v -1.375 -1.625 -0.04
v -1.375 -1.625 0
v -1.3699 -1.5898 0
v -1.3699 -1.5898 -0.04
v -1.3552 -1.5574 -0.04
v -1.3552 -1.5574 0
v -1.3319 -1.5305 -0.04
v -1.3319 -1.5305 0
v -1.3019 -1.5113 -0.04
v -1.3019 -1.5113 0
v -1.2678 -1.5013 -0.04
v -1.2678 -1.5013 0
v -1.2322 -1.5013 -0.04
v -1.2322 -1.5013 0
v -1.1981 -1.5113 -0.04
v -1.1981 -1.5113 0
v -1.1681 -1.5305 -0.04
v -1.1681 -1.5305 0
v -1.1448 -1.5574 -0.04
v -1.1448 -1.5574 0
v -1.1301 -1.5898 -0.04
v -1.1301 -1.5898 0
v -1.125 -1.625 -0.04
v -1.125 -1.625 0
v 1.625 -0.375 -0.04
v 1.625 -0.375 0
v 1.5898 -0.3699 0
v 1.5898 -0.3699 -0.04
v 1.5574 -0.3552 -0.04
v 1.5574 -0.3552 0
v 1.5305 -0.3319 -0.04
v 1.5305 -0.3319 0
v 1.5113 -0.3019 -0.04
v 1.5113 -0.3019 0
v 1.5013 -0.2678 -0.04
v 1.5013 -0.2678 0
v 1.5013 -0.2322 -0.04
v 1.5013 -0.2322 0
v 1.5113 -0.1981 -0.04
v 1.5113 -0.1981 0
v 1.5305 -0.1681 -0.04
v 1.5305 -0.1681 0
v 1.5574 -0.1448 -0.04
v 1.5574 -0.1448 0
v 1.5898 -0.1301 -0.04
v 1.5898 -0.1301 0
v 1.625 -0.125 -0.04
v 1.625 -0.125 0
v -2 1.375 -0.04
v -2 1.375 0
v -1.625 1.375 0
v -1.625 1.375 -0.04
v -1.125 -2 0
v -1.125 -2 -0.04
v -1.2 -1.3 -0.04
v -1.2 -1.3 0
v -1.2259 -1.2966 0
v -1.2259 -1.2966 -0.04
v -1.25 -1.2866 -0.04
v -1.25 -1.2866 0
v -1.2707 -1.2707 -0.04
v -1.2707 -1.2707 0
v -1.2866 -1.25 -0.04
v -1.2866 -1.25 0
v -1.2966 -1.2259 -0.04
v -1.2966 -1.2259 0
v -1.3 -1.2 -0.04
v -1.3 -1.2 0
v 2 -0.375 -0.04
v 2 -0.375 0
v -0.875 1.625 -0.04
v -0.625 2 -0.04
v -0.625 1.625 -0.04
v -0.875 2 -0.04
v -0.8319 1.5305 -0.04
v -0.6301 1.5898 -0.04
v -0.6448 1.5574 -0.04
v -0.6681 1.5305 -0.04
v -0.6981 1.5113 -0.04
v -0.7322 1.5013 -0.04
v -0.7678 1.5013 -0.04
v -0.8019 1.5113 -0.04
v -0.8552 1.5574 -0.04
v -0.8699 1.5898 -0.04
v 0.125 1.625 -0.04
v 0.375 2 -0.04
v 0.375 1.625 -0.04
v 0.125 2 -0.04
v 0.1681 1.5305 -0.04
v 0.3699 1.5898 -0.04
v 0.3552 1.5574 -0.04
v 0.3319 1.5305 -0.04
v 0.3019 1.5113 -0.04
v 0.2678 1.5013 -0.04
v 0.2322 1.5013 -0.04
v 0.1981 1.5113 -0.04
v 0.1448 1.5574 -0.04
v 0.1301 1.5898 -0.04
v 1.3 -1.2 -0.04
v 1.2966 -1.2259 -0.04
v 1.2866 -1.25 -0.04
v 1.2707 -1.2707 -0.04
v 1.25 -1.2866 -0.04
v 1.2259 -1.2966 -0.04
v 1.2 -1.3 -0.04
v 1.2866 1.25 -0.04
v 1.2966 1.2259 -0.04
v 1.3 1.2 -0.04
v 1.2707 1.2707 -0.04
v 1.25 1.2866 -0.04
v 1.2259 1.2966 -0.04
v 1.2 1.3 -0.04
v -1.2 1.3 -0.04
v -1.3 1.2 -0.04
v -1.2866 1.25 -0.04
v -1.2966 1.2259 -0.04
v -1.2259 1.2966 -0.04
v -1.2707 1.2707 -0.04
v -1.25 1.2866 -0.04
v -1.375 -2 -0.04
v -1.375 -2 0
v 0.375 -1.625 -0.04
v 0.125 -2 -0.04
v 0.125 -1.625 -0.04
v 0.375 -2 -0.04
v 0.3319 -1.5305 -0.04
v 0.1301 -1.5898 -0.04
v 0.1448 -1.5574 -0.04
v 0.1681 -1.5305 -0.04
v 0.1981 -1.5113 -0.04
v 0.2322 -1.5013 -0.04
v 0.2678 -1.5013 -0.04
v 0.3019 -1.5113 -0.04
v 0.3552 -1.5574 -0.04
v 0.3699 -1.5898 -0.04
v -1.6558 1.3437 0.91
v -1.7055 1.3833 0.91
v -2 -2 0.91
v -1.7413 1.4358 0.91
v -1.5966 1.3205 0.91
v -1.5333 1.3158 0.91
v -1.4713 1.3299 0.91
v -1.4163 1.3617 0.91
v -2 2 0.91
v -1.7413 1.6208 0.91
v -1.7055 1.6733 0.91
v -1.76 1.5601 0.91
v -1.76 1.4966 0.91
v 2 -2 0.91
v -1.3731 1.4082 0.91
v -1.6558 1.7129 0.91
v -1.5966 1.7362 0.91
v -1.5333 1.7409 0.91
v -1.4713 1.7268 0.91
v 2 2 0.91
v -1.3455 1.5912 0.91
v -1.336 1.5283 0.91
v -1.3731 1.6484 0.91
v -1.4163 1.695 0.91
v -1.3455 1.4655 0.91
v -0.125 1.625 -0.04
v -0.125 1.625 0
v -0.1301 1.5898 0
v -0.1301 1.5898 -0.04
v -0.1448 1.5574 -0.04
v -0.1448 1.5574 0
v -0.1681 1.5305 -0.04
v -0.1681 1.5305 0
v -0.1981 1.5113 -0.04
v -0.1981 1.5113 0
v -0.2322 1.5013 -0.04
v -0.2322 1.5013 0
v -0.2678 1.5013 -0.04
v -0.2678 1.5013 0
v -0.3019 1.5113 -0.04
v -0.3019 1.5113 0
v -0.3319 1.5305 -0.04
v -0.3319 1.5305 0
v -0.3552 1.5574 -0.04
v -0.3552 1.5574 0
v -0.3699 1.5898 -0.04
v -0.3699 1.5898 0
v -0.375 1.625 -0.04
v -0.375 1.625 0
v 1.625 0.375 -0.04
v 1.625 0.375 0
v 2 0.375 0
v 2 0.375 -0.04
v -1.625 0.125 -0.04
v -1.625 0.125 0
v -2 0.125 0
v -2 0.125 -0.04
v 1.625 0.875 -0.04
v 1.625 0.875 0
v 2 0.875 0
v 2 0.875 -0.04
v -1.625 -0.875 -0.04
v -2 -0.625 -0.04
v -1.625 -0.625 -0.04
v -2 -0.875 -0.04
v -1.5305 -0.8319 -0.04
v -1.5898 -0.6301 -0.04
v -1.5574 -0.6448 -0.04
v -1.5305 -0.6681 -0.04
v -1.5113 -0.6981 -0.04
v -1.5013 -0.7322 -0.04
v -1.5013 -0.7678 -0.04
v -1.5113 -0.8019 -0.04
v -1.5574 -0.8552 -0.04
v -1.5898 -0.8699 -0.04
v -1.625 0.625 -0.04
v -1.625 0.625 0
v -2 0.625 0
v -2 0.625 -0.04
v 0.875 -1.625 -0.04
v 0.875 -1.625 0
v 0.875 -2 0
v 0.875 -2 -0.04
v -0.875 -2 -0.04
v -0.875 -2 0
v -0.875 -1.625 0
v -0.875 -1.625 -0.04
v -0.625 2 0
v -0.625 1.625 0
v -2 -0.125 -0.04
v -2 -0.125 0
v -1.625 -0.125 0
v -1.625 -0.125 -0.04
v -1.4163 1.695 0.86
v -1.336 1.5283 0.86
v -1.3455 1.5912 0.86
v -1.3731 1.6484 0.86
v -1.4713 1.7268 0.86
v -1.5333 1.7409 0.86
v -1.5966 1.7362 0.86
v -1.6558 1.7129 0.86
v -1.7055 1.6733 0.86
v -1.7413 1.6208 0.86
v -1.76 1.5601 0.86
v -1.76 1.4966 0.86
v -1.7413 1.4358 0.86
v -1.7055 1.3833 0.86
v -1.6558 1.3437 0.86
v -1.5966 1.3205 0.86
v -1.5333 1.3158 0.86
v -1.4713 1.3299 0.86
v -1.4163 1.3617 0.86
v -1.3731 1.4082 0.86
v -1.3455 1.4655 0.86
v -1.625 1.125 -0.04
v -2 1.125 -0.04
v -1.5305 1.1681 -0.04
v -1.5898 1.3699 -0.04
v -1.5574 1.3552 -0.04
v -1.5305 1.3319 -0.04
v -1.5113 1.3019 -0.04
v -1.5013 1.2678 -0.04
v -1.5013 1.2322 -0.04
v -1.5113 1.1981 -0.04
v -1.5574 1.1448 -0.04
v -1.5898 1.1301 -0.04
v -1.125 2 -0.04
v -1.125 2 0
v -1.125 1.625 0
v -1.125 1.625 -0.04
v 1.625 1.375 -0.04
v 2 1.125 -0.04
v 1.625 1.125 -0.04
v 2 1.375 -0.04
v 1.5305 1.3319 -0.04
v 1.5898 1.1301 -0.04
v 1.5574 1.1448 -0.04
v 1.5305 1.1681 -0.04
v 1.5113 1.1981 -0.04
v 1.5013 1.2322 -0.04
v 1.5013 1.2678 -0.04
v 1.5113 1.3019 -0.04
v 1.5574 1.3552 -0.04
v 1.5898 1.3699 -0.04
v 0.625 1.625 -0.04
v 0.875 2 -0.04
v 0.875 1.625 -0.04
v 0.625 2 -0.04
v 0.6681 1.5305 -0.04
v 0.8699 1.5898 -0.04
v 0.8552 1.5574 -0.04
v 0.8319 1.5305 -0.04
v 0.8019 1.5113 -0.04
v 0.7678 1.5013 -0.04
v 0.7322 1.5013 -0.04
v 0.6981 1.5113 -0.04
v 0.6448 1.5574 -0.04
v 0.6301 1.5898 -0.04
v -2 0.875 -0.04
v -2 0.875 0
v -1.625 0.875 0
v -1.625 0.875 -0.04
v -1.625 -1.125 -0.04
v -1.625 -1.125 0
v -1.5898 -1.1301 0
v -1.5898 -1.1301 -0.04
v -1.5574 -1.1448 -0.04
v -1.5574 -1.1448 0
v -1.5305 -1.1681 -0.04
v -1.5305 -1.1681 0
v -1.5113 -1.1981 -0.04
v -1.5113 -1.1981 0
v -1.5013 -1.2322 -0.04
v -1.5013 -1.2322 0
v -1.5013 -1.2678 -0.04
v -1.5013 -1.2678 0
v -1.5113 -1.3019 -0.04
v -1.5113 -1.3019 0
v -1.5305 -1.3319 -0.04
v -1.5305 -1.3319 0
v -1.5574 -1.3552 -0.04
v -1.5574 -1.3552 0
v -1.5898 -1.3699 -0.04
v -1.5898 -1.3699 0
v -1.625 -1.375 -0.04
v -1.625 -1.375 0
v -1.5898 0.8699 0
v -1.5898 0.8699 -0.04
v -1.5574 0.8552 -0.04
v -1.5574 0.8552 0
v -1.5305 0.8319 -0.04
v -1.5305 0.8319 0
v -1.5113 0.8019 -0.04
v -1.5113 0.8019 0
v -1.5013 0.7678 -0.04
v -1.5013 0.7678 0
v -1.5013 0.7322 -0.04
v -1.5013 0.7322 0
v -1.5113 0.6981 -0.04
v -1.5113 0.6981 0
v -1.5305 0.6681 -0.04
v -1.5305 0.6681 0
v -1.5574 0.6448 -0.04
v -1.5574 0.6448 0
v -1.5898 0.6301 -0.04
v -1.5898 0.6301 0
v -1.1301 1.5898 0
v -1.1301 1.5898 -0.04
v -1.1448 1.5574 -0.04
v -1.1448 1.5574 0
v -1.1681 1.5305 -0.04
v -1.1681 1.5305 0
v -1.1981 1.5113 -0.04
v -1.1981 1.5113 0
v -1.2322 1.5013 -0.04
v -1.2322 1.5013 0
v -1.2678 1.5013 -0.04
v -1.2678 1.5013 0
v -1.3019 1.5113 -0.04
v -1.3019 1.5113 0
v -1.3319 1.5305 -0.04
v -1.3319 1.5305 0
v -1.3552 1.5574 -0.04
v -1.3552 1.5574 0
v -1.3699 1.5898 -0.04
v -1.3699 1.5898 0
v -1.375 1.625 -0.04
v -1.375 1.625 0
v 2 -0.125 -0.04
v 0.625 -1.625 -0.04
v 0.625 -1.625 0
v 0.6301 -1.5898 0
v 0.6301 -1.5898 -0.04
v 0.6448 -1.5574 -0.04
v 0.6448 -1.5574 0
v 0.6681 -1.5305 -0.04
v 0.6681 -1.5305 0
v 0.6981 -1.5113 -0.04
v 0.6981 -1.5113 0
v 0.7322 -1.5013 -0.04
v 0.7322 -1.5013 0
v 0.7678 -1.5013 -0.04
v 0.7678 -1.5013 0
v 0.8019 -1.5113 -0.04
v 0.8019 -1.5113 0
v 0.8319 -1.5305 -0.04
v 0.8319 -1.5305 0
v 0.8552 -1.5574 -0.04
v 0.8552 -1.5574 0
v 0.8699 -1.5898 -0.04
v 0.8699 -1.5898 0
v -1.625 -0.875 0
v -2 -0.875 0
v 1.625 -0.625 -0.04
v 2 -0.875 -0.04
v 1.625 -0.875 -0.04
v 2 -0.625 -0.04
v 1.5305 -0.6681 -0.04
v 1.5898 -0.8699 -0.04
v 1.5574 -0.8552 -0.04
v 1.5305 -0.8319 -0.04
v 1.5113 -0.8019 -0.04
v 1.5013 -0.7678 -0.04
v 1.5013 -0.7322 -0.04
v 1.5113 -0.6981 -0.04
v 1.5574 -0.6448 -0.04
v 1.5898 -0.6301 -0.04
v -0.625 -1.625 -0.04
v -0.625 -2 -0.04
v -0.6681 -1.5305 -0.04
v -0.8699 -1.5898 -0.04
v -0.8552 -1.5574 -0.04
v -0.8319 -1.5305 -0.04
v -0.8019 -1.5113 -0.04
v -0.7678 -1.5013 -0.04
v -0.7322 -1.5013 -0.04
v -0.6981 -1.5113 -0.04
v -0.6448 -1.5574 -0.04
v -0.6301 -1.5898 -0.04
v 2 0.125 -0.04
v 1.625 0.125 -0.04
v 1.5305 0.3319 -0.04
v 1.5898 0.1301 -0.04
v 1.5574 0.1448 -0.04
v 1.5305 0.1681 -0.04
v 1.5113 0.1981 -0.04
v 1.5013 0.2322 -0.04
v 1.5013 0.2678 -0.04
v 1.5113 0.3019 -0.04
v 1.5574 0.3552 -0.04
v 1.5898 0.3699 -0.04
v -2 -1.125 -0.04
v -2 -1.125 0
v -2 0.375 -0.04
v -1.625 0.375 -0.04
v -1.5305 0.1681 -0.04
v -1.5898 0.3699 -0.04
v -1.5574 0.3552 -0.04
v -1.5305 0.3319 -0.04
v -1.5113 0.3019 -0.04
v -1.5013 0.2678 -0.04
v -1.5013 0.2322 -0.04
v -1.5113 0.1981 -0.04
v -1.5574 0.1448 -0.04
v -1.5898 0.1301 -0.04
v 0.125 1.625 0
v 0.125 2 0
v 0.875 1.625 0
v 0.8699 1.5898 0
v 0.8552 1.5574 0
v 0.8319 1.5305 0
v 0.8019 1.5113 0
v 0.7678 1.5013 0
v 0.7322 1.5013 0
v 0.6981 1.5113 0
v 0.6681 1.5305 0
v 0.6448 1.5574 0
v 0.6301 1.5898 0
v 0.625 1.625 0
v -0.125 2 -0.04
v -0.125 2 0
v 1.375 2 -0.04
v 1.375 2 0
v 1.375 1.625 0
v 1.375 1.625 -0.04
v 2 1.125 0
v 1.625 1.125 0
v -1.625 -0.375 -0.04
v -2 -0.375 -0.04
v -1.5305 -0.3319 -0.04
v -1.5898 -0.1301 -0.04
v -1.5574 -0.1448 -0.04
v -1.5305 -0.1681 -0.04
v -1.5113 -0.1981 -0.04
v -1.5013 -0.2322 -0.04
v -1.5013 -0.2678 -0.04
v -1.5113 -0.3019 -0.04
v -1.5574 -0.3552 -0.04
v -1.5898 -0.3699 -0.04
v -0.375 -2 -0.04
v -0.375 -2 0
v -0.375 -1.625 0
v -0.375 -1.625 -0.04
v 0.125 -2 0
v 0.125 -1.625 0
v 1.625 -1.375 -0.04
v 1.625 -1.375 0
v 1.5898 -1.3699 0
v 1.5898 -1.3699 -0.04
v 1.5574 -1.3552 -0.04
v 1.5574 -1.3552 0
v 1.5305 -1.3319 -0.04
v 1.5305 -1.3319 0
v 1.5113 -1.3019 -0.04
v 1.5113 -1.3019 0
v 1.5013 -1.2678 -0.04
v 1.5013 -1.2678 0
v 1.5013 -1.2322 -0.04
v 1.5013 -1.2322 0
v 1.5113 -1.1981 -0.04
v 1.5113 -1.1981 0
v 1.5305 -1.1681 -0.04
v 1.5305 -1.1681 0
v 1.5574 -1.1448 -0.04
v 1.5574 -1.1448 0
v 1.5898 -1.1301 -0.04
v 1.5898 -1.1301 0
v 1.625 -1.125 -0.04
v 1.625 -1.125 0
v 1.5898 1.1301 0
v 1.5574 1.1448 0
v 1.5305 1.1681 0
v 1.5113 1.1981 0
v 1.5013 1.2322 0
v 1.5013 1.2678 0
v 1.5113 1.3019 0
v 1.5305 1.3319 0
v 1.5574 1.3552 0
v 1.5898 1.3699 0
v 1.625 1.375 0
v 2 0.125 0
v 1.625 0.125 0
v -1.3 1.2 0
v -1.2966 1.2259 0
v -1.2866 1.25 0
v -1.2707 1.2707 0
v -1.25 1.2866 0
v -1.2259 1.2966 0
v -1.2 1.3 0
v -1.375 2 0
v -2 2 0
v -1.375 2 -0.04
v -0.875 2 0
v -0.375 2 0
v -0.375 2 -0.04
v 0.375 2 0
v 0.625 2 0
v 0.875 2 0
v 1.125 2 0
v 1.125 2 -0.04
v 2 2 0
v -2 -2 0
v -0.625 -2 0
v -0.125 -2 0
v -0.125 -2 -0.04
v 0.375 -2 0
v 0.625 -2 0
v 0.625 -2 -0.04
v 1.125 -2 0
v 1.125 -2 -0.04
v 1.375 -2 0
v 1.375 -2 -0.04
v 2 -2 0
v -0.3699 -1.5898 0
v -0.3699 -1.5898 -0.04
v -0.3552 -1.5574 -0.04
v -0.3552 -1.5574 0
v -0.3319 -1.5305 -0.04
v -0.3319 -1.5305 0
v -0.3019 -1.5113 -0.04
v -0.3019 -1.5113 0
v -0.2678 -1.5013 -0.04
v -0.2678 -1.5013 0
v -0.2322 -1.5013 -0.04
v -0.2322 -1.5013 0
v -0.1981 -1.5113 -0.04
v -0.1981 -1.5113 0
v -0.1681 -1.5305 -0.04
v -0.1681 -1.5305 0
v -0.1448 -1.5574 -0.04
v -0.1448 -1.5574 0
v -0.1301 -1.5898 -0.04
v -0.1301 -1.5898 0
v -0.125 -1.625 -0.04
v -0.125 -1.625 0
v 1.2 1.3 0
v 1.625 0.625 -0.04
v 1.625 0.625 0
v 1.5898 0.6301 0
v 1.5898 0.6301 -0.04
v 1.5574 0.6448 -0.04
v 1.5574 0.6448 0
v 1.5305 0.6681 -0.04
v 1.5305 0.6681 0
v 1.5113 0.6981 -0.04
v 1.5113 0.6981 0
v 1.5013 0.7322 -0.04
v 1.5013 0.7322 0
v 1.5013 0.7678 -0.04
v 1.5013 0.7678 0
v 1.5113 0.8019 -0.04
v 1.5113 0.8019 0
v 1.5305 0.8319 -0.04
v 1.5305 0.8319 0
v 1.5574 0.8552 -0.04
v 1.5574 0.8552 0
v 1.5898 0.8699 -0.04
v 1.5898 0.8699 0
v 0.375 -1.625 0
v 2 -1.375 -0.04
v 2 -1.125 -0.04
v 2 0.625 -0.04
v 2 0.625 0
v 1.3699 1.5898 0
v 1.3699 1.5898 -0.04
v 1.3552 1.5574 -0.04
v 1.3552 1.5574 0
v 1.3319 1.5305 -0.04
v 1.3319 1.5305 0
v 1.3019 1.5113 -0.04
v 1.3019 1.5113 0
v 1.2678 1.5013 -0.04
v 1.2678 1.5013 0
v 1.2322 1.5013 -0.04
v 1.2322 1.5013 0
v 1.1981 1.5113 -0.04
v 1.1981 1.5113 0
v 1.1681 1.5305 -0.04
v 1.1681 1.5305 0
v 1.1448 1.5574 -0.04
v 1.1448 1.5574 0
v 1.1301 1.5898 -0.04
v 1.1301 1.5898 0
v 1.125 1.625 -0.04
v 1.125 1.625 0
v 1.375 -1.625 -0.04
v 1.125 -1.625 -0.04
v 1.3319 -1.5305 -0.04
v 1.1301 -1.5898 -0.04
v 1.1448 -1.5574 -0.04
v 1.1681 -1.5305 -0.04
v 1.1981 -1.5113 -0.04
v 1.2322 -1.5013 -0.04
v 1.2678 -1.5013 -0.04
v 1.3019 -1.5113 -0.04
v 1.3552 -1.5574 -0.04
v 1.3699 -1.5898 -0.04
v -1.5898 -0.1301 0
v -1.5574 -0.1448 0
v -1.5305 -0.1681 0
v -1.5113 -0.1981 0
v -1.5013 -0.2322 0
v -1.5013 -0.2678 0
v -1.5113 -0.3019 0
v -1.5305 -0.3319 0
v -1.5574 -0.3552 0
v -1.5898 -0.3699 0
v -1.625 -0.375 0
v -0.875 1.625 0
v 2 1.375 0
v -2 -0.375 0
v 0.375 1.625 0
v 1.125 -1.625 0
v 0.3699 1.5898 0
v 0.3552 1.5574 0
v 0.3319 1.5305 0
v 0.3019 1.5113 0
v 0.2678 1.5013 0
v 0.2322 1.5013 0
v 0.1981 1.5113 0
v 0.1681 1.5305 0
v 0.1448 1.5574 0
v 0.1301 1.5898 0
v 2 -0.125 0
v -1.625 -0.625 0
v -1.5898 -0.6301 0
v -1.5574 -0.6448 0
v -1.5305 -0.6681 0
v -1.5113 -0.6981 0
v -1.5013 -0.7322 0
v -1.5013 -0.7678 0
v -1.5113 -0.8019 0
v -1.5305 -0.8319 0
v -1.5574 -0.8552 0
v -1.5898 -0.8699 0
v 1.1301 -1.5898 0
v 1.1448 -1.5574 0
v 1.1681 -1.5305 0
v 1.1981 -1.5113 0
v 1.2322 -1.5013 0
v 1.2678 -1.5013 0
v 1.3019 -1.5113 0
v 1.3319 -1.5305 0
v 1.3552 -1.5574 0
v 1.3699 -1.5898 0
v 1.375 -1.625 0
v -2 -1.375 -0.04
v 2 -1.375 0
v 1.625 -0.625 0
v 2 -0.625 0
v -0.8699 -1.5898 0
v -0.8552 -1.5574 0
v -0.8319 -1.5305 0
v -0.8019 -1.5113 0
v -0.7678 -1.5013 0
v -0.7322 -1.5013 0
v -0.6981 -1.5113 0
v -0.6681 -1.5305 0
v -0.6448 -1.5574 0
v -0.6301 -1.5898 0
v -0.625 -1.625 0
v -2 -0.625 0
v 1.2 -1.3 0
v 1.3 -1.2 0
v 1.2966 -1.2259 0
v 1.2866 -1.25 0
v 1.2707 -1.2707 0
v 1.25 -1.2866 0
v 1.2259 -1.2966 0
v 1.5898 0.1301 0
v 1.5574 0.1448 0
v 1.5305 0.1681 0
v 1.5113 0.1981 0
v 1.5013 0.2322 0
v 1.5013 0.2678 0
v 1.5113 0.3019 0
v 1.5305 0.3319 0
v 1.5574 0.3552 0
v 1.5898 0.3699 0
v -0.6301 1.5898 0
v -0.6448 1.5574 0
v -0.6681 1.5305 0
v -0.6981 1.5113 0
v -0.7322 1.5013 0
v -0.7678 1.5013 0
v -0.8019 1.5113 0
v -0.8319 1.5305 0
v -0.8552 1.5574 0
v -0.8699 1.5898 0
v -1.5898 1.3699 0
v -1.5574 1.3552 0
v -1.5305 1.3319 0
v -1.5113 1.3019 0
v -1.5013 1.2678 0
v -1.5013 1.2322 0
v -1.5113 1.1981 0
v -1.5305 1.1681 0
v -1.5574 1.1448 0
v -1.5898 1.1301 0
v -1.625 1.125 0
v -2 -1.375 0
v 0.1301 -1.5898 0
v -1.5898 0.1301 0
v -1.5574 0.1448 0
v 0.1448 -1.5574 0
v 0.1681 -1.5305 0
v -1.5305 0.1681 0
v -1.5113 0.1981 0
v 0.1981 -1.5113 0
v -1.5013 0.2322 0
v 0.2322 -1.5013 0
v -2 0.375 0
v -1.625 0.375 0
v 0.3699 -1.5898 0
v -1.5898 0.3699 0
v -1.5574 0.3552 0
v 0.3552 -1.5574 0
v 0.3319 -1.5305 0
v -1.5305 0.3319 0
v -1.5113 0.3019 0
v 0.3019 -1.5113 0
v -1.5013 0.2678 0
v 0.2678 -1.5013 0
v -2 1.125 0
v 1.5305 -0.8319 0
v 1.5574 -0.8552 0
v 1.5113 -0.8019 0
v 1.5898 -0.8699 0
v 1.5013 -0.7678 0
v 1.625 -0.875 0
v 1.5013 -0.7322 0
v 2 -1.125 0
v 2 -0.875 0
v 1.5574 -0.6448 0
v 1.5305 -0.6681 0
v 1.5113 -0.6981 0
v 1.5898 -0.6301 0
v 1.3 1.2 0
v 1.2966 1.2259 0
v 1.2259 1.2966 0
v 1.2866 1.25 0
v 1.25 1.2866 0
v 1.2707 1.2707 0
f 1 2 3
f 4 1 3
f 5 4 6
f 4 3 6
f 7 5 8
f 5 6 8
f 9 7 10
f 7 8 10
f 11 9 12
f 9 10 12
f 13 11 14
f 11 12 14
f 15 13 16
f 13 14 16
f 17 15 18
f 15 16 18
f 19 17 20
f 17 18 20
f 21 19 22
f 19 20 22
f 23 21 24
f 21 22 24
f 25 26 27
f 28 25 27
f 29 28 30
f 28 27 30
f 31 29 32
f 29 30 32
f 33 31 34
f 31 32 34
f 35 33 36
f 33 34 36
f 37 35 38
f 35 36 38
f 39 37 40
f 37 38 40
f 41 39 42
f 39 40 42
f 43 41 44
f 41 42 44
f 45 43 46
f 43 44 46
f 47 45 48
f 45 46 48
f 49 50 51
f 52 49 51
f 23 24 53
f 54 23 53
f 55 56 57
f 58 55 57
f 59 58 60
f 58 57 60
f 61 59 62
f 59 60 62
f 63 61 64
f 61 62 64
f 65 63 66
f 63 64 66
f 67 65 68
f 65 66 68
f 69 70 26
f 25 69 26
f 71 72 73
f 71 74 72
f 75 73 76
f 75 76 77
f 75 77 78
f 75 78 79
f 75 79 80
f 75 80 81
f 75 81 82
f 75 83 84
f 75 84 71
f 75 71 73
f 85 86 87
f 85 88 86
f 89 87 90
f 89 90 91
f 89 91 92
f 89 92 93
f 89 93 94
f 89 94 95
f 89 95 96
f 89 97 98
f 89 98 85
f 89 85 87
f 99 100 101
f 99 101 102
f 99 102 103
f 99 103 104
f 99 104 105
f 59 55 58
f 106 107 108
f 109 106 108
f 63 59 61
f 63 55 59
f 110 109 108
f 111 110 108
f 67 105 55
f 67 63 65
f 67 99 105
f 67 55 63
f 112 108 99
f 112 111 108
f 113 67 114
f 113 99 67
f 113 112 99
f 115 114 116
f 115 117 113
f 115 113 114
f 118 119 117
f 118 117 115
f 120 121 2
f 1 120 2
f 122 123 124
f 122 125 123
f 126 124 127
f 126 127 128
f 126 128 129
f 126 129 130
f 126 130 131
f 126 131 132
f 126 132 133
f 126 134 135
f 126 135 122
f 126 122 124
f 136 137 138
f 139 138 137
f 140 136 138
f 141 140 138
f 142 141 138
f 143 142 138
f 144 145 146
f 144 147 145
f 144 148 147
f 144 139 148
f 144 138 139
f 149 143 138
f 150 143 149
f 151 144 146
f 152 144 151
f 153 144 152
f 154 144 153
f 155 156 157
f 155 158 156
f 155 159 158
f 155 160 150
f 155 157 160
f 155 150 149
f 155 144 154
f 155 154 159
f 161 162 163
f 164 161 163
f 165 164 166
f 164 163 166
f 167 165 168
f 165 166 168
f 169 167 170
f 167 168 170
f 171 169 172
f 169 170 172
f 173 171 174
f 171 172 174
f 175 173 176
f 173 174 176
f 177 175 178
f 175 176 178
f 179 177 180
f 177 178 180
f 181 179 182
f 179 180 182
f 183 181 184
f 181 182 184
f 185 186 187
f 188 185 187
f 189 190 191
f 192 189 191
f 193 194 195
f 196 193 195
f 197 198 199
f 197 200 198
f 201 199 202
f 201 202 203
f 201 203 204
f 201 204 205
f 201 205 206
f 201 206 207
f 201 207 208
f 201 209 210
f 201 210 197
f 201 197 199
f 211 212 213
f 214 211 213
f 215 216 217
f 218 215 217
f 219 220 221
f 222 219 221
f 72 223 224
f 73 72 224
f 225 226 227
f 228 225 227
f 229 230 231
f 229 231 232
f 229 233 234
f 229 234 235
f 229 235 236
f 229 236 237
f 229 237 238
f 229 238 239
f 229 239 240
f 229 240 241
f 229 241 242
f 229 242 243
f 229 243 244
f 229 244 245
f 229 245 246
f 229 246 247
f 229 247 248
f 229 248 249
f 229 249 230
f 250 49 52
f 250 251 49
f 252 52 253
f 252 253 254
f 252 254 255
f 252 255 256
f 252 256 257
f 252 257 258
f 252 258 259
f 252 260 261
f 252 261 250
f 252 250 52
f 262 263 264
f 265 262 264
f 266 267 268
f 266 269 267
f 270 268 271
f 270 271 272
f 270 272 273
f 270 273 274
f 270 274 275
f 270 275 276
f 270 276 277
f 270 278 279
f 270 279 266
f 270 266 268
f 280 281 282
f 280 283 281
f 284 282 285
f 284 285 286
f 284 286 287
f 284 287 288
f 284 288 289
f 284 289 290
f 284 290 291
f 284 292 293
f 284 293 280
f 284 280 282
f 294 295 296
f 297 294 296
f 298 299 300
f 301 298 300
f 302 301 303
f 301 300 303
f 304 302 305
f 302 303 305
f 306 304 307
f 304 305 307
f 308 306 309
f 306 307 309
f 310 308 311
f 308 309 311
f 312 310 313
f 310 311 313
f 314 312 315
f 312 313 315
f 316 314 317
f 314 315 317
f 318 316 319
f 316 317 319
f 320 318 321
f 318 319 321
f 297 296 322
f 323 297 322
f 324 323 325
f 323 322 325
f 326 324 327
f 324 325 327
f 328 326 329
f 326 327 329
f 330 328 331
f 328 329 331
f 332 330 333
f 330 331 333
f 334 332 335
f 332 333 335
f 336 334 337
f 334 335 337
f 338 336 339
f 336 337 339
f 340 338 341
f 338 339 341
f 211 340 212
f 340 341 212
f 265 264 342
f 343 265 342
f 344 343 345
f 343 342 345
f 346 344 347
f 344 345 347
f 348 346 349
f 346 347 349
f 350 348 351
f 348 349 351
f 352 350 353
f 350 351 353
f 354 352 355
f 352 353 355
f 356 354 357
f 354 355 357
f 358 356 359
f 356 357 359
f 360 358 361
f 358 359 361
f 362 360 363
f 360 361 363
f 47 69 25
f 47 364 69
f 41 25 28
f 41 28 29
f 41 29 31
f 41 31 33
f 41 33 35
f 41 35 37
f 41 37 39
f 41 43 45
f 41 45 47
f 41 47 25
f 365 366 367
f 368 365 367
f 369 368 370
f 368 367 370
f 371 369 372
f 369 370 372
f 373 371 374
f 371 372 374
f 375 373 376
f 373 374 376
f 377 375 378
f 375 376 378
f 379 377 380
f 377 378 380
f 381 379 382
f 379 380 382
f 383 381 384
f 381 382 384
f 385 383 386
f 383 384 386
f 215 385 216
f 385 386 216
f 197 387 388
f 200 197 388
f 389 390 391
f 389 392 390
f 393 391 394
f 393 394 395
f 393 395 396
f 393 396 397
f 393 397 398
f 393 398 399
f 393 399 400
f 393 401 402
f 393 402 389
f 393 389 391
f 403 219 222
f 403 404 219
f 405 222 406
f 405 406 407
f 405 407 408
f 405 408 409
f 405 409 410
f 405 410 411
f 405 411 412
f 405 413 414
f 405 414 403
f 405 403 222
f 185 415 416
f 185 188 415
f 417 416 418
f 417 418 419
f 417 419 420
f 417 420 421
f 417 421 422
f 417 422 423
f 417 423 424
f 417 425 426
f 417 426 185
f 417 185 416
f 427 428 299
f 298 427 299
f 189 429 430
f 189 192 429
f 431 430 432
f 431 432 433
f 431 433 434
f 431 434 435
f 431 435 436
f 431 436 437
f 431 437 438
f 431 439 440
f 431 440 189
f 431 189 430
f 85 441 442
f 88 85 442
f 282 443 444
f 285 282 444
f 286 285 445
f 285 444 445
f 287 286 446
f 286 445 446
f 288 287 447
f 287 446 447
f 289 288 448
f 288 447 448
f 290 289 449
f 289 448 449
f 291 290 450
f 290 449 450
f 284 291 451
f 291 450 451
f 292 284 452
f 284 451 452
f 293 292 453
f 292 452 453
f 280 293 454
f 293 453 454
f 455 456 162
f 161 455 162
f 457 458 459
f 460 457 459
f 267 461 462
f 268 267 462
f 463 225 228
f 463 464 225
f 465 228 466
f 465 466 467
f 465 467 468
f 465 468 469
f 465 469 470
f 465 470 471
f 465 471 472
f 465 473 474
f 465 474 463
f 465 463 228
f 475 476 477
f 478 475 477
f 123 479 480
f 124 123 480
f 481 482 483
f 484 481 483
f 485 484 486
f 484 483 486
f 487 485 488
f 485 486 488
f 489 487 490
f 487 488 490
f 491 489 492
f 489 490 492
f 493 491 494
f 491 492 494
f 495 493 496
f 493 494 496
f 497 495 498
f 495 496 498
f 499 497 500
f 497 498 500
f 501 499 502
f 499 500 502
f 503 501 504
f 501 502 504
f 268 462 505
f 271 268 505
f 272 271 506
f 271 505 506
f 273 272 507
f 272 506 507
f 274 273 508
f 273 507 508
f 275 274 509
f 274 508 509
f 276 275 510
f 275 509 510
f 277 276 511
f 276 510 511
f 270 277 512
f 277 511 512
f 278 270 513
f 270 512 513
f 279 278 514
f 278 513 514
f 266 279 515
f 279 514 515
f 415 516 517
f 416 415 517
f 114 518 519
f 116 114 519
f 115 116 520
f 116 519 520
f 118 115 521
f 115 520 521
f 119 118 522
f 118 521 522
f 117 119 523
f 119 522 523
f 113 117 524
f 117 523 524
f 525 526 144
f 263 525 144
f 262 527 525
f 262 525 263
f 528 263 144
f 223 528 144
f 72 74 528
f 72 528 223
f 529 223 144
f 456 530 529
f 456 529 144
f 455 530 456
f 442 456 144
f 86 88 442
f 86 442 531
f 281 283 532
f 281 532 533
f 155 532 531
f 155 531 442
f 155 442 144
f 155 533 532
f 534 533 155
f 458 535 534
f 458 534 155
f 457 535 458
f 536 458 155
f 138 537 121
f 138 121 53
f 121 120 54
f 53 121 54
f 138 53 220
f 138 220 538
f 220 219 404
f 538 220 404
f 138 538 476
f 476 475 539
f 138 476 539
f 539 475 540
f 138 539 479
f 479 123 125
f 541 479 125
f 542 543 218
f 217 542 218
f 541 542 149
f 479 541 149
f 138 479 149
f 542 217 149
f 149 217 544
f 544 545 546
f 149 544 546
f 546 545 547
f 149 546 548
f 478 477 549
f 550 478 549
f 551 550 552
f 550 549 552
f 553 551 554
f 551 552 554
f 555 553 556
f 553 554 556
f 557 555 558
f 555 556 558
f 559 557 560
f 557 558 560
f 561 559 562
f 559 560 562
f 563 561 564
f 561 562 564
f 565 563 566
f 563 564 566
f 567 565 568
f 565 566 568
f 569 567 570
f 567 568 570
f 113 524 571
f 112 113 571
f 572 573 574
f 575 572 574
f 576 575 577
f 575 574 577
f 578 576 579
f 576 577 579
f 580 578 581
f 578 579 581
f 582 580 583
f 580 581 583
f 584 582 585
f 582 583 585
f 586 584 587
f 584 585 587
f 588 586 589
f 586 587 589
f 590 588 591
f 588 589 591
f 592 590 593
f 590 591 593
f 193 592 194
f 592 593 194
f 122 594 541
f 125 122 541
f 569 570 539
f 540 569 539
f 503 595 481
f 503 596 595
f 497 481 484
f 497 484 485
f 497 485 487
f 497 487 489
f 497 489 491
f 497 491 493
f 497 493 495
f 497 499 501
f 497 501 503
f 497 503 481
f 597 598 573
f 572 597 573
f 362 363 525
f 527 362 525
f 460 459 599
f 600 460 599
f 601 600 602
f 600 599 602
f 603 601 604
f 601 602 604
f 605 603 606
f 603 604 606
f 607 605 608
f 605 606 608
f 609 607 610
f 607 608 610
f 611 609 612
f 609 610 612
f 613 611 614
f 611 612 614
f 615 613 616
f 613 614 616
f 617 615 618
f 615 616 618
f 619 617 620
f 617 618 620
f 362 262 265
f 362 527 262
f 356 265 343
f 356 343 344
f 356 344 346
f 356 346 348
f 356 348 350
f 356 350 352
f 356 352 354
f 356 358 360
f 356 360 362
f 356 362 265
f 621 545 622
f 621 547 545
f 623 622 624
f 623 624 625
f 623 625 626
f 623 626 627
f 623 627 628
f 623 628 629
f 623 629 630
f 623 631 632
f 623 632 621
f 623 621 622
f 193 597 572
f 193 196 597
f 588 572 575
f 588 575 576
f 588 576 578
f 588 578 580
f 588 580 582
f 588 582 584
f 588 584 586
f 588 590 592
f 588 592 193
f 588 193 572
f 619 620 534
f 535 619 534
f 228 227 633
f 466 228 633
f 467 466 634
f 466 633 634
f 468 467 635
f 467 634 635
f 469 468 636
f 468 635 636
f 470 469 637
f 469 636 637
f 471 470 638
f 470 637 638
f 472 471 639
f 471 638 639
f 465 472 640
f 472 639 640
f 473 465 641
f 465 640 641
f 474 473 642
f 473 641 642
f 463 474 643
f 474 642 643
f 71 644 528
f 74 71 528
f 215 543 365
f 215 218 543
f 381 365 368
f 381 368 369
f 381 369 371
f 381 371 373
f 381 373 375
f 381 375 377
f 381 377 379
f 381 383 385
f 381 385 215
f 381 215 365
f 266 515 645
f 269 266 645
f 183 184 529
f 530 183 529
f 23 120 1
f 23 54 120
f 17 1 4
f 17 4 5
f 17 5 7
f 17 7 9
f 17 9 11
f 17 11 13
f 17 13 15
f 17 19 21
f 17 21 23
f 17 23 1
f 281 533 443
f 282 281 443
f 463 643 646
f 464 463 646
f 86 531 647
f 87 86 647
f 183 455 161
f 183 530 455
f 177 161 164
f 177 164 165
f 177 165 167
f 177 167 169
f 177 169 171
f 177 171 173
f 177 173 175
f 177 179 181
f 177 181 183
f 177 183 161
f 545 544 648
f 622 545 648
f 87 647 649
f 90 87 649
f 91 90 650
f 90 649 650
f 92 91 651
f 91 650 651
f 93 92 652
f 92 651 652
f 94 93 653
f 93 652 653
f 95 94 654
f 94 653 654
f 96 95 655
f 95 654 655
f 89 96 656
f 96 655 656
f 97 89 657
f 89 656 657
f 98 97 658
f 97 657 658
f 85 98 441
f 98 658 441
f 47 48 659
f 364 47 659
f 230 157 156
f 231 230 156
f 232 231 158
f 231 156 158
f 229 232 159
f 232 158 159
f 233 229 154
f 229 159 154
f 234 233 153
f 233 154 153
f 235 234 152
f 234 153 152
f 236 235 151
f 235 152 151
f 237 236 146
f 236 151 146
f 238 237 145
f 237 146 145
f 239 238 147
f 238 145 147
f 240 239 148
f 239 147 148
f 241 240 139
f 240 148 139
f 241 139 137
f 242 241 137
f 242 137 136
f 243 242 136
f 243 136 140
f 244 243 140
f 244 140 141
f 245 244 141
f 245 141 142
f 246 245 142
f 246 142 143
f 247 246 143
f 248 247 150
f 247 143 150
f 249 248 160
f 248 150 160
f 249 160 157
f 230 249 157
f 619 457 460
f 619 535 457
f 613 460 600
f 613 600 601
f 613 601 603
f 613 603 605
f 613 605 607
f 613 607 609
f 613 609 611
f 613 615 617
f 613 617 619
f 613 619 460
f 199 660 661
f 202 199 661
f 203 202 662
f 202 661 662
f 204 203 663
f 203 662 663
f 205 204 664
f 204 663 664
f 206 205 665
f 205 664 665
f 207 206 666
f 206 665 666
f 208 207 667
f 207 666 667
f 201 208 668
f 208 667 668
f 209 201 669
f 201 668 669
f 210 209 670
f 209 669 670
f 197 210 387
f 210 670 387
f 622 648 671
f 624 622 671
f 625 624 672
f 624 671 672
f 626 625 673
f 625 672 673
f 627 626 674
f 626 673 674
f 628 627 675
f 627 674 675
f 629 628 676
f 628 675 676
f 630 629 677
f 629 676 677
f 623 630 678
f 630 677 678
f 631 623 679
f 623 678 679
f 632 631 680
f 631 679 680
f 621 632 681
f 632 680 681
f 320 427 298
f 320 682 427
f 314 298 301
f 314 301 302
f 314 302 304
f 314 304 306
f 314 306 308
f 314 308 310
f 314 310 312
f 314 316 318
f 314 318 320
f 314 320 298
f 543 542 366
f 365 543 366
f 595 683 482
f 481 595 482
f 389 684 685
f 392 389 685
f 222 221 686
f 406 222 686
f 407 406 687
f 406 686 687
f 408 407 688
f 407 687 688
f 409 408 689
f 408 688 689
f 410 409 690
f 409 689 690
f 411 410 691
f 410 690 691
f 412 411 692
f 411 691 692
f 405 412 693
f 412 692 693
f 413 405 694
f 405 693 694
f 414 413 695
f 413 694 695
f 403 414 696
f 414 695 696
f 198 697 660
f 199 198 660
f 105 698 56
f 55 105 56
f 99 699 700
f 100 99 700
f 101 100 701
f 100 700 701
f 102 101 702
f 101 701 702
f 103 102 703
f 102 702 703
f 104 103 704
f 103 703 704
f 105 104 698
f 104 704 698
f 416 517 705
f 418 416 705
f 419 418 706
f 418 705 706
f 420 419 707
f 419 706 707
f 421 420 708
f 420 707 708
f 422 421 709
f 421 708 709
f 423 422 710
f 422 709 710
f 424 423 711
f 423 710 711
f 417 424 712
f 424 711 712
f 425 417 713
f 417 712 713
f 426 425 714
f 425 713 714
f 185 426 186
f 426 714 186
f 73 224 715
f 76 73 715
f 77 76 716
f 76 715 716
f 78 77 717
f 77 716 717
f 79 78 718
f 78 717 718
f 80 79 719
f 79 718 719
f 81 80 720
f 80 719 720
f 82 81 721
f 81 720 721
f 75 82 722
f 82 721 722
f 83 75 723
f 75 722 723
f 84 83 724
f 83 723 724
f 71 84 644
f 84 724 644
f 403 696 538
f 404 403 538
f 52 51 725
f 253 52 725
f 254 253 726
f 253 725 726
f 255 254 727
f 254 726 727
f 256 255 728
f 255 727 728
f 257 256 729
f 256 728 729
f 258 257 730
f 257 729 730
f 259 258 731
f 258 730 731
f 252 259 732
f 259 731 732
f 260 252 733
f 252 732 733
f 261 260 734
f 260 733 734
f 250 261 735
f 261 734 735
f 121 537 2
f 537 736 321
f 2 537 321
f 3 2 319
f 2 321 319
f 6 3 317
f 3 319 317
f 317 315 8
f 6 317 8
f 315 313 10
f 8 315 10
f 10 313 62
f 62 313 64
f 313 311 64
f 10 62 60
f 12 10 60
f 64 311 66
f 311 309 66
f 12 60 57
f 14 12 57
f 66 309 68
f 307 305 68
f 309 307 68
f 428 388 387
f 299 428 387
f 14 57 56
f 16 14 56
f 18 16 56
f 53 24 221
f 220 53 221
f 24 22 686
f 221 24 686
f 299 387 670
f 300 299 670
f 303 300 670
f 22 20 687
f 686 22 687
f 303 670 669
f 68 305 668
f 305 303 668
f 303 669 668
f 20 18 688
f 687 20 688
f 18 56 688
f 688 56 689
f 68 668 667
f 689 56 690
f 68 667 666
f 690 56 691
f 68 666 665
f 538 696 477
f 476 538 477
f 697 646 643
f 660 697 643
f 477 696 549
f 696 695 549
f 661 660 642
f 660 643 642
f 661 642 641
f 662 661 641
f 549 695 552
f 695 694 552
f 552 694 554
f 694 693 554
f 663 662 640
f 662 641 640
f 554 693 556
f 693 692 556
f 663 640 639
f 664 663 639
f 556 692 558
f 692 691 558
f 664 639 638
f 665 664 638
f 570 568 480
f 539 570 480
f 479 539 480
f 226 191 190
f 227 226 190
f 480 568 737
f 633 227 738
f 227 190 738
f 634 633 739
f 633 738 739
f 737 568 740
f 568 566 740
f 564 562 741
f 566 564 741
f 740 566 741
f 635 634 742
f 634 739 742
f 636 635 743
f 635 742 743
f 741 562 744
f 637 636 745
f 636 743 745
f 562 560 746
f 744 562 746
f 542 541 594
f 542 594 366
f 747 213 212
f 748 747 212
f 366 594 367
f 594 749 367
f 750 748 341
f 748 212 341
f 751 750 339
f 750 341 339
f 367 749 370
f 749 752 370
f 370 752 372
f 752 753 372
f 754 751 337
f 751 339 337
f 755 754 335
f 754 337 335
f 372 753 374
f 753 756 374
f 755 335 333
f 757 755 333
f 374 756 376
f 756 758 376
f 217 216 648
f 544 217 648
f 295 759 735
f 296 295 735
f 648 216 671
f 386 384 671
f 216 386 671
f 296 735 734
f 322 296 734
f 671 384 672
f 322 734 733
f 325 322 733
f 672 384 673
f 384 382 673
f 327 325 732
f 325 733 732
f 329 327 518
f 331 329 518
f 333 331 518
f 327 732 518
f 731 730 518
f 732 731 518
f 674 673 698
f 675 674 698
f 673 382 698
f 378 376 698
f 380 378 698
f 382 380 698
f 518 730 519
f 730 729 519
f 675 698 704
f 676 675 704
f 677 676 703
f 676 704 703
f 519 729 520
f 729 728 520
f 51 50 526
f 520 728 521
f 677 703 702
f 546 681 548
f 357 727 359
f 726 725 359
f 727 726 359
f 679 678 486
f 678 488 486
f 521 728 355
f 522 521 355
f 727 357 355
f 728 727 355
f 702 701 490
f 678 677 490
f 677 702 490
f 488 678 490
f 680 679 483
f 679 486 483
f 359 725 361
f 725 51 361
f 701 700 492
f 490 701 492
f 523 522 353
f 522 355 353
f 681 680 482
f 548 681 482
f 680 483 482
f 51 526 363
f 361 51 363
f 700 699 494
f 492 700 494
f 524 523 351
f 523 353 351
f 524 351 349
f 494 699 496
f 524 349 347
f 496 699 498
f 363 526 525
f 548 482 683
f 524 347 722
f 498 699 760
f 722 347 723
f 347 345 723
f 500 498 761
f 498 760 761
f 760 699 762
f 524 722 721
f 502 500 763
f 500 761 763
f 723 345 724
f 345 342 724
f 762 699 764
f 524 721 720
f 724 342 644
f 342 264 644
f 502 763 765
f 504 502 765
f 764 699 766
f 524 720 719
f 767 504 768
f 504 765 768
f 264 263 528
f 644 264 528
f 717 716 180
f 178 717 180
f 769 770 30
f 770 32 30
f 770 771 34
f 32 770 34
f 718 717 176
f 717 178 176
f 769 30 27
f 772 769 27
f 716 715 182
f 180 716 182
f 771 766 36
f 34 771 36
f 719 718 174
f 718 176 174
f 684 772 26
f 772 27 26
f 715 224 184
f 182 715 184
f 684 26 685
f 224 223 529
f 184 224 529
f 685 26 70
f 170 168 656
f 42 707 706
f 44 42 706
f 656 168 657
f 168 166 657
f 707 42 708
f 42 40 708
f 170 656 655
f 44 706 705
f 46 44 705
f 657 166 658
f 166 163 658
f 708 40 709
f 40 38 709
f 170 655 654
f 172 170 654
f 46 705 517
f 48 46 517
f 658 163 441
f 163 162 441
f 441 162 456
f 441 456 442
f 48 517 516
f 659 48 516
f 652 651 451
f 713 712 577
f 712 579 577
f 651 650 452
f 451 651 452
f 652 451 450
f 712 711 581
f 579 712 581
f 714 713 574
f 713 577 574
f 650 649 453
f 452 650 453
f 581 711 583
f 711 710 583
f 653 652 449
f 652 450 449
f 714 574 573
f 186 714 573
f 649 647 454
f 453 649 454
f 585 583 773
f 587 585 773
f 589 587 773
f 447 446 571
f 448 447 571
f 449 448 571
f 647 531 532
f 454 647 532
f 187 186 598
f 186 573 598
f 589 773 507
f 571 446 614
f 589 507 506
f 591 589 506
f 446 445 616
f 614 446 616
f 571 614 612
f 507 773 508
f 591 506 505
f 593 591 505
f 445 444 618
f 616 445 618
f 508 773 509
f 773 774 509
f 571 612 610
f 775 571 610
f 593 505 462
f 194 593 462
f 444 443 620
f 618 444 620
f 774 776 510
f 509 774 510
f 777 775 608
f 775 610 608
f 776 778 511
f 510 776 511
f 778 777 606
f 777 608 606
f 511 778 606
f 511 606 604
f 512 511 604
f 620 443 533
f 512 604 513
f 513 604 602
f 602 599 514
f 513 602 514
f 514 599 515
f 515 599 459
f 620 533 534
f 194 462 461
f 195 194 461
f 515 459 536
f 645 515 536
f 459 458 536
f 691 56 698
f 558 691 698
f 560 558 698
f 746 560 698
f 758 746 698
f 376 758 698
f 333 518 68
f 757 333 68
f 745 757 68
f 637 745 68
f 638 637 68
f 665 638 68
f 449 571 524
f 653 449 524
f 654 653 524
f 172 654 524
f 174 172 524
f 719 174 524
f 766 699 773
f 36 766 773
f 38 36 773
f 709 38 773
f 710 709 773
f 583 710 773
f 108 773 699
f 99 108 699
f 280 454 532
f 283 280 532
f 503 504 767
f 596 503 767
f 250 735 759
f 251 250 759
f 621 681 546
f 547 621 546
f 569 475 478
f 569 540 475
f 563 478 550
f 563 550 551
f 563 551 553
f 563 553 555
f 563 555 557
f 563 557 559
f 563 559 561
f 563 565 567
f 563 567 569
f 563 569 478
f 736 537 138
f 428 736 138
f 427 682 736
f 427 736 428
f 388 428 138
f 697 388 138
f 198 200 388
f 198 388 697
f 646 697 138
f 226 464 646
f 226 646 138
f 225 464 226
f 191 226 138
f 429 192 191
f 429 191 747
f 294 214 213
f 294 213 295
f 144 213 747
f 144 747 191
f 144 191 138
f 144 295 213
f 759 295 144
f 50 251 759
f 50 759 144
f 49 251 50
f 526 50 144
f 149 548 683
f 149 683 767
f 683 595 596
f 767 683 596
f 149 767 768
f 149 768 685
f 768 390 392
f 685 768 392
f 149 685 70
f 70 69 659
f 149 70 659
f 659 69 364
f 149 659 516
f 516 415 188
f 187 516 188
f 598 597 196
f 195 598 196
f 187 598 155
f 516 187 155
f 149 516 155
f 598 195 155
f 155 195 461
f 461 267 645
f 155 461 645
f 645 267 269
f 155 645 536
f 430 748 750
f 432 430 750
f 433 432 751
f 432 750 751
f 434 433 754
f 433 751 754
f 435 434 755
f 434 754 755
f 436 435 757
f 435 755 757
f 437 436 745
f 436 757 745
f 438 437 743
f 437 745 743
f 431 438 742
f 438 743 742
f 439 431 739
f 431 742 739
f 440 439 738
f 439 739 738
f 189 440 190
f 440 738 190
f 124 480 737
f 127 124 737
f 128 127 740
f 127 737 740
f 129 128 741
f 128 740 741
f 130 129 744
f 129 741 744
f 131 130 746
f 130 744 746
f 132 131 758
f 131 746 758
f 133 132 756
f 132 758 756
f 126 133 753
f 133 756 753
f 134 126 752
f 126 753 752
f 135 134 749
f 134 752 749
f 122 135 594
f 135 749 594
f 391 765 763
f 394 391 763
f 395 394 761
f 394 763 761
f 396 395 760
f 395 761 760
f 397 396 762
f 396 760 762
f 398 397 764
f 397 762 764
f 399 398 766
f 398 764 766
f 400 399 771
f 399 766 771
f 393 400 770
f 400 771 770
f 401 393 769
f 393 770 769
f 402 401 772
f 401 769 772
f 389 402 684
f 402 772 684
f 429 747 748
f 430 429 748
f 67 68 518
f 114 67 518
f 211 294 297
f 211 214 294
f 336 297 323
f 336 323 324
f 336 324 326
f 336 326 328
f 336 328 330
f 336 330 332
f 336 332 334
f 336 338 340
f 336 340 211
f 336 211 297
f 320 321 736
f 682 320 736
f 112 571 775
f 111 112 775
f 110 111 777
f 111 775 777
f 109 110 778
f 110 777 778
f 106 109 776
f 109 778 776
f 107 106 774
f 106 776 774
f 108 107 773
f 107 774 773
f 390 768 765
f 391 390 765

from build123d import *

# Parameters (mm, degrees)
SKETCH1_W                 = 4
SKETCH1_H                 = 4
BOSS_EXTRUDE1_DEPTH       = 0.91
BOSS_EXTRUDE2_DEPTH       = 0.04
BOSS_EXTRUDE3_DEPTH       = 0.04
LPATTERN1_COUNT           = 6
LPATTERN1_PITCH           = 0.5
CIRPATTERN1_COUNT         = 4
CIRPATTERN1_COPY_1_DEPTH  = 0.04
CIRPATTERN1_COPY_2_DEPTH  = 0.04
CIRPATTERN1_COPY_3_DEPTH  = 0.04
CIRPATTERN1_COPY_4_DEPTH  = 0.04
CIRPATTERN1_COPY_5_DEPTH  = 0.04
CIRPATTERN1_COPY_6_DEPTH  = 0.04
CIRPATTERN1_COPY_7_DEPTH  = 0.04
CIRPATTERN1_COPY_8_DEPTH  = 0.04
CIRPATTERN1_COPY_9_DEPTH  = 0.04
CIRPATTERN1_COPY_10_DEPTH = 0.04
CIRPATTERN1_COPY_11_DEPTH = 0.04
CIRPATTERN1_COPY_12_DEPTH = 0.04
CIRPATTERN1_COPY_13_DEPTH = 0.04
CIRPATTERN1_COPY_14_DEPTH = 0.04
CIRPATTERN1_COPY_15_DEPTH = 0.04
SKETCH4_R                 = 0.213174932
CUT_EXTRUDE1_DEPTH        = 0.05


with BuildPart() as part:
    # Sketch1 → Boss-Extrude1 (new body)
    with BuildSketch(Plane.XY):
        Rectangle(SKETCH1_W, SKETCH1_H)
    extrude(amount=BOSS_EXTRUDE1_DEPTH)

    # Sketch2 → Boss-Extrude2 (add)
    with BuildSketch(Plane(origin=(0, 0, 0), x_dir=(-1, 0, 0), z_dir=(0, 0, -1))):
        with BuildLine():
            Line((-1.2, -1.3), (1.2, -1.3))
            ThreePointArc((1.2, -1.3), (1.270710678, -1.270710678), (1.3, -1.2))
            Line((1.3, -1.2), (1.3, 1.2))
            ThreePointArc((1.3, 1.2), (1.270710678, 1.270710678), (1.2, 1.3))
            Line((1.2, 1.3), (-1.2, 1.3))
            ThreePointArc((-1.2, 1.3), (-1.270710678, 1.270710678), (-1.3, 1.2))
            Line((-1.3, 1.2), (-1.3, -1.2))
            ThreePointArc((-1.3, -1.2), (-1.270710678, -1.270710678), (-1.2, -1.3))
        make_face()
    extrude(amount=BOSS_EXTRUDE2_DEPTH)

    # Sketch3 → Boss-Extrude3 (add)
    with BuildSketch(Plane(origin=(0, 0, 0), x_dir=(-1, 0, 0), z_dir=(0, 0, -1))):
        with BuildLine():
            Line((-2, 1.125), (-1.625, 1.125))
            ThreePointArc((-1.625, 1.125), (-1.5, 1.25), (-1.625, 1.375))
            Line((-1.625, 1.375), (-2, 1.375))
            Line((-2, 1.375), (-2, 1.125))
        make_face()
    boss_extrude3 = extrude(amount=BOSS_EXTRUDE3_DEPTH)

    # LPattern1: Boss-Extrude3 ×6
    with Locations(*[(0, -i * LPATTERN1_PITCH, 0) for i in range(1, LPATTERN1_COUNT)]):
        add(boss_extrude3)

    # CirPattern1: Boss-Extrude3 ×4 about axis
    cirpattern1_axis = Axis((0, 0, 0), (0, 0, 1))
    for i in range(1, CIRPATTERN1_COUNT):
        add(boss_extrude3.rotate(cirpattern1_axis, i * 360 / CIRPATTERN1_COUNT))

    # CirPattern1 copy 1 sketch → CirPattern1 copy 1 (add)
    with BuildSketch(Plane(origin=(0.5, 0, 0), x_dir=(0, -1, 0), z_dir=(0, 0, -1))):
        with BuildLine():
            Line((-2, 1.125), (-1.625, 1.125))
            ThreePointArc((-1.625, 1.125), (-1.5, 1.25), (-1.625, 1.375))
            Line((-1.625, 1.375), (-2, 1.375))
            Line((-2, 1.375), (-2, 1.125))
        make_face()
    extrude(amount=CIRPATTERN1_COPY_1_DEPTH)

    # CirPattern1 copy 2 sketch → CirPattern1 copy 2 (add)
    with BuildSketch(Plane(origin=(0, 0.5, 0), x_dir=(1, 0, 0), z_dir=(0, 0, -1))):
        with BuildLine():
            Line((-2, 1.125), (-1.625, 1.125))
            ThreePointArc((-1.625, 1.125), (-1.5, 1.25), (-1.625, 1.375))
            Line((-1.625, 1.375), (-2, 1.375))
            Line((-2, 1.375), (-2, 1.125))
        make_face()
    extrude(amount=CIRPATTERN1_COPY_2_DEPTH)

    # CirPattern1 copy 3 sketch → CirPattern1 copy 3 (add)
    with BuildSketch(Plane(origin=(-0.5, 0, 0), x_dir=(0, 1, 0), z_dir=(0, 0, -1))):
        with BuildLine():
            Line((-2, 1.125), (-1.625, 1.125))
            ThreePointArc((-1.625, 1.125), (-1.5, 1.25), (-1.625, 1.375))
            Line((-1.625, 1.375), (-2, 1.375))
            Line((-2, 1.375), (-2, 1.125))
        make_face()
    extrude(amount=CIRPATTERN1_COPY_3_DEPTH)

    # CirPattern1 copy 4 sketch → CirPattern1 copy 4 (add)
    with BuildSketch(Plane(origin=(1, 0, 0), x_dir=(0, -1, 0), z_dir=(0, 0, -1))):
        with BuildLine():
            Line((-2, 1.125), (-1.625, 1.125))
            ThreePointArc((-1.625, 1.125), (-1.5, 1.25), (-1.625, 1.375))
            Line((-1.625, 1.375), (-2, 1.375))
            Line((-2, 1.375), (-2, 1.125))
        make_face()
    extrude(amount=CIRPATTERN1_COPY_4_DEPTH)

    # CirPattern1 copy 5 sketch → CirPattern1 copy 5 (add)
    with BuildSketch(Plane(origin=(0, 1, 0), x_dir=(1, 0, 0), z_dir=(0, 0, -1))):
        with BuildLine():
            Line((-2, 1.125), (-1.625, 1.125))
            ThreePointArc((-1.625, 1.125), (-1.5, 1.25), (-1.625, 1.375))
            Line((-1.625, 1.375), (-2, 1.375))
            Line((-2, 1.375), (-2, 1.125))
        make_face()
    extrude(amount=CIRPATTERN1_COPY_5_DEPTH)

    # CirPattern1 copy 6 sketch → CirPattern1 copy 6 (add)
    with BuildSketch(Plane(origin=(-1, 0, 0), x_dir=(0, 1, 0), z_dir=(0, 0, -1))):
        with BuildLine():
            Line((-2, 1.125), (-1.625, 1.125))
            ThreePointArc((-1.625, 1.125), (-1.5, 1.25), (-1.625, 1.375))
            Line((-1.625, 1.375), (-2, 1.375))
            Line((-2, 1.375), (-2, 1.125))
        make_face()
    extrude(amount=CIRPATTERN1_COPY_6_DEPTH)

    # CirPattern1 copy 7 sketch → CirPattern1 copy 7 (add)
    with BuildSketch(Plane(origin=(1.5, 0, 0), x_dir=(0, -1, 0), z_dir=(0, 0, -1))):
        with BuildLine():
            Line((-2, 1.125), (-1.625, 1.125))
            ThreePointArc((-1.625, 1.125), (-1.5, 1.25), (-1.625, 1.375))
            Line((-1.625, 1.375), (-2, 1.375))
            Line((-2, 1.375), (-2, 1.125))
        make_face()
    extrude(amount=CIRPATTERN1_COPY_7_DEPTH)

    # CirPattern1 copy 8 sketch → CirPattern1 copy 8 (add)
    with BuildSketch(Plane(origin=(0, 1.5, 0), x_dir=(1, 0, 0), z_dir=(0, 0, -1))):
        with BuildLine():
            Line((-2, 1.125), (-1.625, 1.125))
            ThreePointArc((-1.625, 1.125), (-1.5, 1.25), (-1.625, 1.375))
            Line((-1.625, 1.375), (-2, 1.375))
            Line((-2, 1.375), (-2, 1.125))
        make_face()
    extrude(amount=CIRPATTERN1_COPY_8_DEPTH)

    # CirPattern1 copy 9 sketch → CirPattern1 copy 9 (add)
    with BuildSketch(Plane(origin=(-1.5, 0, 0), x_dir=(0, 1, 0), z_dir=(0, 0, -1))):
        with BuildLine():
            Line((-2, 1.125), (-1.625, 1.125))
            ThreePointArc((-1.625, 1.125), (-1.5, 1.25), (-1.625, 1.375))
            Line((-1.625, 1.375), (-2, 1.375))
            Line((-2, 1.375), (-2, 1.125))
        make_face()
    extrude(amount=CIRPATTERN1_COPY_9_DEPTH)

    # CirPattern1 copy 10 sketch → CirPattern1 copy 10 (add)
    with BuildSketch(Plane(origin=(2, 0, 0), x_dir=(0, -1, 0), z_dir=(0, 0, -1))):
        with BuildLine():
            Line((-2, 1.125), (-1.625, 1.125))
            ThreePointArc((-1.625, 1.125), (-1.5, 1.25), (-1.625, 1.375))
            Line((-1.625, 1.375), (-2, 1.375))
            Line((-2, 1.375), (-2, 1.125))
        make_face()
    extrude(amount=CIRPATTERN1_COPY_10_DEPTH)

    # CirPattern1 copy 11 sketch → CirPattern1 copy 11 (add)
    with BuildSketch(Plane(origin=(0, 2, 0), x_dir=(1, 0, 0), z_dir=(0, 0, -1))):
        with BuildLine():
            Line((-2, 1.125), (-1.625, 1.125))
            ThreePointArc((-1.625, 1.125), (-1.5, 1.25), (-1.625, 1.375))
            Line((-1.625, 1.375), (-2, 1.375))
            Line((-2, 1.375), (-2, 1.125))
        make_face()
    extrude(amount=CIRPATTERN1_COPY_11_DEPTH)

    # CirPattern1 copy 12 sketch → CirPattern1 copy 12 (add)
    with BuildSketch(Plane(origin=(-2, 0, 0), x_dir=(0, 1, 0), z_dir=(0, 0, -1))):
        with BuildLine():
            Line((-2, 1.125), (-1.625, 1.125))
            ThreePointArc((-1.625, 1.125), (-1.5, 1.25), (-1.625, 1.375))
            Line((-1.625, 1.375), (-2, 1.375))
            Line((-2, 1.375), (-2, 1.125))
        make_face()
    extrude(amount=CIRPATTERN1_COPY_12_DEPTH)

    # CirPattern1 copy 13 sketch → CirPattern1 copy 13 (add)
    with BuildSketch(Plane(origin=(2.5, 0, 0), x_dir=(0, -1, 0), z_dir=(0, 0, -1))):
        with BuildLine():
            Line((-2, 1.125), (-1.625, 1.125))
            ThreePointArc((-1.625, 1.125), (-1.5, 1.25), (-1.625, 1.375))
            Line((-1.625, 1.375), (-2, 1.375))
            Line((-2, 1.375), (-2, 1.125))
        make_face()
    extrude(amount=CIRPATTERN1_COPY_13_DEPTH)

    # CirPattern1 copy 14 sketch → CirPattern1 copy 14 (add)
    with BuildSketch(Plane(origin=(0, 2.5, 0), x_dir=(1, 0, 0), z_dir=(0, 0, -1))):
        with BuildLine():
            Line((-2, 1.125), (-1.625, 1.125))
            ThreePointArc((-1.625, 1.125), (-1.5, 1.25), (-1.625, 1.375))
            Line((-1.625, 1.375), (-2, 1.375))
            Line((-2, 1.375), (-2, 1.125))
        make_face()
    extrude(amount=CIRPATTERN1_COPY_14_DEPTH)

    # CirPattern1 copy 15 sketch → CirPattern1 copy 15 (add)
    with BuildSketch(Plane(origin=(-2.5, 0, 0), x_dir=(0, 1, 0), z_dir=(0, 0, -1))):
        with BuildLine():
            Line((-2, 1.125), (-1.625, 1.125))
            ThreePointArc((-1.625, 1.125), (-1.5, 1.25), (-1.625, 1.375))
            Line((-1.625, 1.375), (-2, 1.375))
            Line((-2, 1.375), (-2, 1.125))
        make_face()
    extrude(amount=CIRPATTERN1_COPY_15_DEPTH)

    # Sketch4 → Cut-Extrude1 (cut)
    with BuildSketch(Plane.XY.offset(0.91)):
        with Locations((-1.549189325, 1.528334853)):
            Circle(SKETCH4_R)
    extrude(amount=-CUT_EXTRUDE1_DEPTH, mode=Mode.SUBTRACT)


solid = part.part
